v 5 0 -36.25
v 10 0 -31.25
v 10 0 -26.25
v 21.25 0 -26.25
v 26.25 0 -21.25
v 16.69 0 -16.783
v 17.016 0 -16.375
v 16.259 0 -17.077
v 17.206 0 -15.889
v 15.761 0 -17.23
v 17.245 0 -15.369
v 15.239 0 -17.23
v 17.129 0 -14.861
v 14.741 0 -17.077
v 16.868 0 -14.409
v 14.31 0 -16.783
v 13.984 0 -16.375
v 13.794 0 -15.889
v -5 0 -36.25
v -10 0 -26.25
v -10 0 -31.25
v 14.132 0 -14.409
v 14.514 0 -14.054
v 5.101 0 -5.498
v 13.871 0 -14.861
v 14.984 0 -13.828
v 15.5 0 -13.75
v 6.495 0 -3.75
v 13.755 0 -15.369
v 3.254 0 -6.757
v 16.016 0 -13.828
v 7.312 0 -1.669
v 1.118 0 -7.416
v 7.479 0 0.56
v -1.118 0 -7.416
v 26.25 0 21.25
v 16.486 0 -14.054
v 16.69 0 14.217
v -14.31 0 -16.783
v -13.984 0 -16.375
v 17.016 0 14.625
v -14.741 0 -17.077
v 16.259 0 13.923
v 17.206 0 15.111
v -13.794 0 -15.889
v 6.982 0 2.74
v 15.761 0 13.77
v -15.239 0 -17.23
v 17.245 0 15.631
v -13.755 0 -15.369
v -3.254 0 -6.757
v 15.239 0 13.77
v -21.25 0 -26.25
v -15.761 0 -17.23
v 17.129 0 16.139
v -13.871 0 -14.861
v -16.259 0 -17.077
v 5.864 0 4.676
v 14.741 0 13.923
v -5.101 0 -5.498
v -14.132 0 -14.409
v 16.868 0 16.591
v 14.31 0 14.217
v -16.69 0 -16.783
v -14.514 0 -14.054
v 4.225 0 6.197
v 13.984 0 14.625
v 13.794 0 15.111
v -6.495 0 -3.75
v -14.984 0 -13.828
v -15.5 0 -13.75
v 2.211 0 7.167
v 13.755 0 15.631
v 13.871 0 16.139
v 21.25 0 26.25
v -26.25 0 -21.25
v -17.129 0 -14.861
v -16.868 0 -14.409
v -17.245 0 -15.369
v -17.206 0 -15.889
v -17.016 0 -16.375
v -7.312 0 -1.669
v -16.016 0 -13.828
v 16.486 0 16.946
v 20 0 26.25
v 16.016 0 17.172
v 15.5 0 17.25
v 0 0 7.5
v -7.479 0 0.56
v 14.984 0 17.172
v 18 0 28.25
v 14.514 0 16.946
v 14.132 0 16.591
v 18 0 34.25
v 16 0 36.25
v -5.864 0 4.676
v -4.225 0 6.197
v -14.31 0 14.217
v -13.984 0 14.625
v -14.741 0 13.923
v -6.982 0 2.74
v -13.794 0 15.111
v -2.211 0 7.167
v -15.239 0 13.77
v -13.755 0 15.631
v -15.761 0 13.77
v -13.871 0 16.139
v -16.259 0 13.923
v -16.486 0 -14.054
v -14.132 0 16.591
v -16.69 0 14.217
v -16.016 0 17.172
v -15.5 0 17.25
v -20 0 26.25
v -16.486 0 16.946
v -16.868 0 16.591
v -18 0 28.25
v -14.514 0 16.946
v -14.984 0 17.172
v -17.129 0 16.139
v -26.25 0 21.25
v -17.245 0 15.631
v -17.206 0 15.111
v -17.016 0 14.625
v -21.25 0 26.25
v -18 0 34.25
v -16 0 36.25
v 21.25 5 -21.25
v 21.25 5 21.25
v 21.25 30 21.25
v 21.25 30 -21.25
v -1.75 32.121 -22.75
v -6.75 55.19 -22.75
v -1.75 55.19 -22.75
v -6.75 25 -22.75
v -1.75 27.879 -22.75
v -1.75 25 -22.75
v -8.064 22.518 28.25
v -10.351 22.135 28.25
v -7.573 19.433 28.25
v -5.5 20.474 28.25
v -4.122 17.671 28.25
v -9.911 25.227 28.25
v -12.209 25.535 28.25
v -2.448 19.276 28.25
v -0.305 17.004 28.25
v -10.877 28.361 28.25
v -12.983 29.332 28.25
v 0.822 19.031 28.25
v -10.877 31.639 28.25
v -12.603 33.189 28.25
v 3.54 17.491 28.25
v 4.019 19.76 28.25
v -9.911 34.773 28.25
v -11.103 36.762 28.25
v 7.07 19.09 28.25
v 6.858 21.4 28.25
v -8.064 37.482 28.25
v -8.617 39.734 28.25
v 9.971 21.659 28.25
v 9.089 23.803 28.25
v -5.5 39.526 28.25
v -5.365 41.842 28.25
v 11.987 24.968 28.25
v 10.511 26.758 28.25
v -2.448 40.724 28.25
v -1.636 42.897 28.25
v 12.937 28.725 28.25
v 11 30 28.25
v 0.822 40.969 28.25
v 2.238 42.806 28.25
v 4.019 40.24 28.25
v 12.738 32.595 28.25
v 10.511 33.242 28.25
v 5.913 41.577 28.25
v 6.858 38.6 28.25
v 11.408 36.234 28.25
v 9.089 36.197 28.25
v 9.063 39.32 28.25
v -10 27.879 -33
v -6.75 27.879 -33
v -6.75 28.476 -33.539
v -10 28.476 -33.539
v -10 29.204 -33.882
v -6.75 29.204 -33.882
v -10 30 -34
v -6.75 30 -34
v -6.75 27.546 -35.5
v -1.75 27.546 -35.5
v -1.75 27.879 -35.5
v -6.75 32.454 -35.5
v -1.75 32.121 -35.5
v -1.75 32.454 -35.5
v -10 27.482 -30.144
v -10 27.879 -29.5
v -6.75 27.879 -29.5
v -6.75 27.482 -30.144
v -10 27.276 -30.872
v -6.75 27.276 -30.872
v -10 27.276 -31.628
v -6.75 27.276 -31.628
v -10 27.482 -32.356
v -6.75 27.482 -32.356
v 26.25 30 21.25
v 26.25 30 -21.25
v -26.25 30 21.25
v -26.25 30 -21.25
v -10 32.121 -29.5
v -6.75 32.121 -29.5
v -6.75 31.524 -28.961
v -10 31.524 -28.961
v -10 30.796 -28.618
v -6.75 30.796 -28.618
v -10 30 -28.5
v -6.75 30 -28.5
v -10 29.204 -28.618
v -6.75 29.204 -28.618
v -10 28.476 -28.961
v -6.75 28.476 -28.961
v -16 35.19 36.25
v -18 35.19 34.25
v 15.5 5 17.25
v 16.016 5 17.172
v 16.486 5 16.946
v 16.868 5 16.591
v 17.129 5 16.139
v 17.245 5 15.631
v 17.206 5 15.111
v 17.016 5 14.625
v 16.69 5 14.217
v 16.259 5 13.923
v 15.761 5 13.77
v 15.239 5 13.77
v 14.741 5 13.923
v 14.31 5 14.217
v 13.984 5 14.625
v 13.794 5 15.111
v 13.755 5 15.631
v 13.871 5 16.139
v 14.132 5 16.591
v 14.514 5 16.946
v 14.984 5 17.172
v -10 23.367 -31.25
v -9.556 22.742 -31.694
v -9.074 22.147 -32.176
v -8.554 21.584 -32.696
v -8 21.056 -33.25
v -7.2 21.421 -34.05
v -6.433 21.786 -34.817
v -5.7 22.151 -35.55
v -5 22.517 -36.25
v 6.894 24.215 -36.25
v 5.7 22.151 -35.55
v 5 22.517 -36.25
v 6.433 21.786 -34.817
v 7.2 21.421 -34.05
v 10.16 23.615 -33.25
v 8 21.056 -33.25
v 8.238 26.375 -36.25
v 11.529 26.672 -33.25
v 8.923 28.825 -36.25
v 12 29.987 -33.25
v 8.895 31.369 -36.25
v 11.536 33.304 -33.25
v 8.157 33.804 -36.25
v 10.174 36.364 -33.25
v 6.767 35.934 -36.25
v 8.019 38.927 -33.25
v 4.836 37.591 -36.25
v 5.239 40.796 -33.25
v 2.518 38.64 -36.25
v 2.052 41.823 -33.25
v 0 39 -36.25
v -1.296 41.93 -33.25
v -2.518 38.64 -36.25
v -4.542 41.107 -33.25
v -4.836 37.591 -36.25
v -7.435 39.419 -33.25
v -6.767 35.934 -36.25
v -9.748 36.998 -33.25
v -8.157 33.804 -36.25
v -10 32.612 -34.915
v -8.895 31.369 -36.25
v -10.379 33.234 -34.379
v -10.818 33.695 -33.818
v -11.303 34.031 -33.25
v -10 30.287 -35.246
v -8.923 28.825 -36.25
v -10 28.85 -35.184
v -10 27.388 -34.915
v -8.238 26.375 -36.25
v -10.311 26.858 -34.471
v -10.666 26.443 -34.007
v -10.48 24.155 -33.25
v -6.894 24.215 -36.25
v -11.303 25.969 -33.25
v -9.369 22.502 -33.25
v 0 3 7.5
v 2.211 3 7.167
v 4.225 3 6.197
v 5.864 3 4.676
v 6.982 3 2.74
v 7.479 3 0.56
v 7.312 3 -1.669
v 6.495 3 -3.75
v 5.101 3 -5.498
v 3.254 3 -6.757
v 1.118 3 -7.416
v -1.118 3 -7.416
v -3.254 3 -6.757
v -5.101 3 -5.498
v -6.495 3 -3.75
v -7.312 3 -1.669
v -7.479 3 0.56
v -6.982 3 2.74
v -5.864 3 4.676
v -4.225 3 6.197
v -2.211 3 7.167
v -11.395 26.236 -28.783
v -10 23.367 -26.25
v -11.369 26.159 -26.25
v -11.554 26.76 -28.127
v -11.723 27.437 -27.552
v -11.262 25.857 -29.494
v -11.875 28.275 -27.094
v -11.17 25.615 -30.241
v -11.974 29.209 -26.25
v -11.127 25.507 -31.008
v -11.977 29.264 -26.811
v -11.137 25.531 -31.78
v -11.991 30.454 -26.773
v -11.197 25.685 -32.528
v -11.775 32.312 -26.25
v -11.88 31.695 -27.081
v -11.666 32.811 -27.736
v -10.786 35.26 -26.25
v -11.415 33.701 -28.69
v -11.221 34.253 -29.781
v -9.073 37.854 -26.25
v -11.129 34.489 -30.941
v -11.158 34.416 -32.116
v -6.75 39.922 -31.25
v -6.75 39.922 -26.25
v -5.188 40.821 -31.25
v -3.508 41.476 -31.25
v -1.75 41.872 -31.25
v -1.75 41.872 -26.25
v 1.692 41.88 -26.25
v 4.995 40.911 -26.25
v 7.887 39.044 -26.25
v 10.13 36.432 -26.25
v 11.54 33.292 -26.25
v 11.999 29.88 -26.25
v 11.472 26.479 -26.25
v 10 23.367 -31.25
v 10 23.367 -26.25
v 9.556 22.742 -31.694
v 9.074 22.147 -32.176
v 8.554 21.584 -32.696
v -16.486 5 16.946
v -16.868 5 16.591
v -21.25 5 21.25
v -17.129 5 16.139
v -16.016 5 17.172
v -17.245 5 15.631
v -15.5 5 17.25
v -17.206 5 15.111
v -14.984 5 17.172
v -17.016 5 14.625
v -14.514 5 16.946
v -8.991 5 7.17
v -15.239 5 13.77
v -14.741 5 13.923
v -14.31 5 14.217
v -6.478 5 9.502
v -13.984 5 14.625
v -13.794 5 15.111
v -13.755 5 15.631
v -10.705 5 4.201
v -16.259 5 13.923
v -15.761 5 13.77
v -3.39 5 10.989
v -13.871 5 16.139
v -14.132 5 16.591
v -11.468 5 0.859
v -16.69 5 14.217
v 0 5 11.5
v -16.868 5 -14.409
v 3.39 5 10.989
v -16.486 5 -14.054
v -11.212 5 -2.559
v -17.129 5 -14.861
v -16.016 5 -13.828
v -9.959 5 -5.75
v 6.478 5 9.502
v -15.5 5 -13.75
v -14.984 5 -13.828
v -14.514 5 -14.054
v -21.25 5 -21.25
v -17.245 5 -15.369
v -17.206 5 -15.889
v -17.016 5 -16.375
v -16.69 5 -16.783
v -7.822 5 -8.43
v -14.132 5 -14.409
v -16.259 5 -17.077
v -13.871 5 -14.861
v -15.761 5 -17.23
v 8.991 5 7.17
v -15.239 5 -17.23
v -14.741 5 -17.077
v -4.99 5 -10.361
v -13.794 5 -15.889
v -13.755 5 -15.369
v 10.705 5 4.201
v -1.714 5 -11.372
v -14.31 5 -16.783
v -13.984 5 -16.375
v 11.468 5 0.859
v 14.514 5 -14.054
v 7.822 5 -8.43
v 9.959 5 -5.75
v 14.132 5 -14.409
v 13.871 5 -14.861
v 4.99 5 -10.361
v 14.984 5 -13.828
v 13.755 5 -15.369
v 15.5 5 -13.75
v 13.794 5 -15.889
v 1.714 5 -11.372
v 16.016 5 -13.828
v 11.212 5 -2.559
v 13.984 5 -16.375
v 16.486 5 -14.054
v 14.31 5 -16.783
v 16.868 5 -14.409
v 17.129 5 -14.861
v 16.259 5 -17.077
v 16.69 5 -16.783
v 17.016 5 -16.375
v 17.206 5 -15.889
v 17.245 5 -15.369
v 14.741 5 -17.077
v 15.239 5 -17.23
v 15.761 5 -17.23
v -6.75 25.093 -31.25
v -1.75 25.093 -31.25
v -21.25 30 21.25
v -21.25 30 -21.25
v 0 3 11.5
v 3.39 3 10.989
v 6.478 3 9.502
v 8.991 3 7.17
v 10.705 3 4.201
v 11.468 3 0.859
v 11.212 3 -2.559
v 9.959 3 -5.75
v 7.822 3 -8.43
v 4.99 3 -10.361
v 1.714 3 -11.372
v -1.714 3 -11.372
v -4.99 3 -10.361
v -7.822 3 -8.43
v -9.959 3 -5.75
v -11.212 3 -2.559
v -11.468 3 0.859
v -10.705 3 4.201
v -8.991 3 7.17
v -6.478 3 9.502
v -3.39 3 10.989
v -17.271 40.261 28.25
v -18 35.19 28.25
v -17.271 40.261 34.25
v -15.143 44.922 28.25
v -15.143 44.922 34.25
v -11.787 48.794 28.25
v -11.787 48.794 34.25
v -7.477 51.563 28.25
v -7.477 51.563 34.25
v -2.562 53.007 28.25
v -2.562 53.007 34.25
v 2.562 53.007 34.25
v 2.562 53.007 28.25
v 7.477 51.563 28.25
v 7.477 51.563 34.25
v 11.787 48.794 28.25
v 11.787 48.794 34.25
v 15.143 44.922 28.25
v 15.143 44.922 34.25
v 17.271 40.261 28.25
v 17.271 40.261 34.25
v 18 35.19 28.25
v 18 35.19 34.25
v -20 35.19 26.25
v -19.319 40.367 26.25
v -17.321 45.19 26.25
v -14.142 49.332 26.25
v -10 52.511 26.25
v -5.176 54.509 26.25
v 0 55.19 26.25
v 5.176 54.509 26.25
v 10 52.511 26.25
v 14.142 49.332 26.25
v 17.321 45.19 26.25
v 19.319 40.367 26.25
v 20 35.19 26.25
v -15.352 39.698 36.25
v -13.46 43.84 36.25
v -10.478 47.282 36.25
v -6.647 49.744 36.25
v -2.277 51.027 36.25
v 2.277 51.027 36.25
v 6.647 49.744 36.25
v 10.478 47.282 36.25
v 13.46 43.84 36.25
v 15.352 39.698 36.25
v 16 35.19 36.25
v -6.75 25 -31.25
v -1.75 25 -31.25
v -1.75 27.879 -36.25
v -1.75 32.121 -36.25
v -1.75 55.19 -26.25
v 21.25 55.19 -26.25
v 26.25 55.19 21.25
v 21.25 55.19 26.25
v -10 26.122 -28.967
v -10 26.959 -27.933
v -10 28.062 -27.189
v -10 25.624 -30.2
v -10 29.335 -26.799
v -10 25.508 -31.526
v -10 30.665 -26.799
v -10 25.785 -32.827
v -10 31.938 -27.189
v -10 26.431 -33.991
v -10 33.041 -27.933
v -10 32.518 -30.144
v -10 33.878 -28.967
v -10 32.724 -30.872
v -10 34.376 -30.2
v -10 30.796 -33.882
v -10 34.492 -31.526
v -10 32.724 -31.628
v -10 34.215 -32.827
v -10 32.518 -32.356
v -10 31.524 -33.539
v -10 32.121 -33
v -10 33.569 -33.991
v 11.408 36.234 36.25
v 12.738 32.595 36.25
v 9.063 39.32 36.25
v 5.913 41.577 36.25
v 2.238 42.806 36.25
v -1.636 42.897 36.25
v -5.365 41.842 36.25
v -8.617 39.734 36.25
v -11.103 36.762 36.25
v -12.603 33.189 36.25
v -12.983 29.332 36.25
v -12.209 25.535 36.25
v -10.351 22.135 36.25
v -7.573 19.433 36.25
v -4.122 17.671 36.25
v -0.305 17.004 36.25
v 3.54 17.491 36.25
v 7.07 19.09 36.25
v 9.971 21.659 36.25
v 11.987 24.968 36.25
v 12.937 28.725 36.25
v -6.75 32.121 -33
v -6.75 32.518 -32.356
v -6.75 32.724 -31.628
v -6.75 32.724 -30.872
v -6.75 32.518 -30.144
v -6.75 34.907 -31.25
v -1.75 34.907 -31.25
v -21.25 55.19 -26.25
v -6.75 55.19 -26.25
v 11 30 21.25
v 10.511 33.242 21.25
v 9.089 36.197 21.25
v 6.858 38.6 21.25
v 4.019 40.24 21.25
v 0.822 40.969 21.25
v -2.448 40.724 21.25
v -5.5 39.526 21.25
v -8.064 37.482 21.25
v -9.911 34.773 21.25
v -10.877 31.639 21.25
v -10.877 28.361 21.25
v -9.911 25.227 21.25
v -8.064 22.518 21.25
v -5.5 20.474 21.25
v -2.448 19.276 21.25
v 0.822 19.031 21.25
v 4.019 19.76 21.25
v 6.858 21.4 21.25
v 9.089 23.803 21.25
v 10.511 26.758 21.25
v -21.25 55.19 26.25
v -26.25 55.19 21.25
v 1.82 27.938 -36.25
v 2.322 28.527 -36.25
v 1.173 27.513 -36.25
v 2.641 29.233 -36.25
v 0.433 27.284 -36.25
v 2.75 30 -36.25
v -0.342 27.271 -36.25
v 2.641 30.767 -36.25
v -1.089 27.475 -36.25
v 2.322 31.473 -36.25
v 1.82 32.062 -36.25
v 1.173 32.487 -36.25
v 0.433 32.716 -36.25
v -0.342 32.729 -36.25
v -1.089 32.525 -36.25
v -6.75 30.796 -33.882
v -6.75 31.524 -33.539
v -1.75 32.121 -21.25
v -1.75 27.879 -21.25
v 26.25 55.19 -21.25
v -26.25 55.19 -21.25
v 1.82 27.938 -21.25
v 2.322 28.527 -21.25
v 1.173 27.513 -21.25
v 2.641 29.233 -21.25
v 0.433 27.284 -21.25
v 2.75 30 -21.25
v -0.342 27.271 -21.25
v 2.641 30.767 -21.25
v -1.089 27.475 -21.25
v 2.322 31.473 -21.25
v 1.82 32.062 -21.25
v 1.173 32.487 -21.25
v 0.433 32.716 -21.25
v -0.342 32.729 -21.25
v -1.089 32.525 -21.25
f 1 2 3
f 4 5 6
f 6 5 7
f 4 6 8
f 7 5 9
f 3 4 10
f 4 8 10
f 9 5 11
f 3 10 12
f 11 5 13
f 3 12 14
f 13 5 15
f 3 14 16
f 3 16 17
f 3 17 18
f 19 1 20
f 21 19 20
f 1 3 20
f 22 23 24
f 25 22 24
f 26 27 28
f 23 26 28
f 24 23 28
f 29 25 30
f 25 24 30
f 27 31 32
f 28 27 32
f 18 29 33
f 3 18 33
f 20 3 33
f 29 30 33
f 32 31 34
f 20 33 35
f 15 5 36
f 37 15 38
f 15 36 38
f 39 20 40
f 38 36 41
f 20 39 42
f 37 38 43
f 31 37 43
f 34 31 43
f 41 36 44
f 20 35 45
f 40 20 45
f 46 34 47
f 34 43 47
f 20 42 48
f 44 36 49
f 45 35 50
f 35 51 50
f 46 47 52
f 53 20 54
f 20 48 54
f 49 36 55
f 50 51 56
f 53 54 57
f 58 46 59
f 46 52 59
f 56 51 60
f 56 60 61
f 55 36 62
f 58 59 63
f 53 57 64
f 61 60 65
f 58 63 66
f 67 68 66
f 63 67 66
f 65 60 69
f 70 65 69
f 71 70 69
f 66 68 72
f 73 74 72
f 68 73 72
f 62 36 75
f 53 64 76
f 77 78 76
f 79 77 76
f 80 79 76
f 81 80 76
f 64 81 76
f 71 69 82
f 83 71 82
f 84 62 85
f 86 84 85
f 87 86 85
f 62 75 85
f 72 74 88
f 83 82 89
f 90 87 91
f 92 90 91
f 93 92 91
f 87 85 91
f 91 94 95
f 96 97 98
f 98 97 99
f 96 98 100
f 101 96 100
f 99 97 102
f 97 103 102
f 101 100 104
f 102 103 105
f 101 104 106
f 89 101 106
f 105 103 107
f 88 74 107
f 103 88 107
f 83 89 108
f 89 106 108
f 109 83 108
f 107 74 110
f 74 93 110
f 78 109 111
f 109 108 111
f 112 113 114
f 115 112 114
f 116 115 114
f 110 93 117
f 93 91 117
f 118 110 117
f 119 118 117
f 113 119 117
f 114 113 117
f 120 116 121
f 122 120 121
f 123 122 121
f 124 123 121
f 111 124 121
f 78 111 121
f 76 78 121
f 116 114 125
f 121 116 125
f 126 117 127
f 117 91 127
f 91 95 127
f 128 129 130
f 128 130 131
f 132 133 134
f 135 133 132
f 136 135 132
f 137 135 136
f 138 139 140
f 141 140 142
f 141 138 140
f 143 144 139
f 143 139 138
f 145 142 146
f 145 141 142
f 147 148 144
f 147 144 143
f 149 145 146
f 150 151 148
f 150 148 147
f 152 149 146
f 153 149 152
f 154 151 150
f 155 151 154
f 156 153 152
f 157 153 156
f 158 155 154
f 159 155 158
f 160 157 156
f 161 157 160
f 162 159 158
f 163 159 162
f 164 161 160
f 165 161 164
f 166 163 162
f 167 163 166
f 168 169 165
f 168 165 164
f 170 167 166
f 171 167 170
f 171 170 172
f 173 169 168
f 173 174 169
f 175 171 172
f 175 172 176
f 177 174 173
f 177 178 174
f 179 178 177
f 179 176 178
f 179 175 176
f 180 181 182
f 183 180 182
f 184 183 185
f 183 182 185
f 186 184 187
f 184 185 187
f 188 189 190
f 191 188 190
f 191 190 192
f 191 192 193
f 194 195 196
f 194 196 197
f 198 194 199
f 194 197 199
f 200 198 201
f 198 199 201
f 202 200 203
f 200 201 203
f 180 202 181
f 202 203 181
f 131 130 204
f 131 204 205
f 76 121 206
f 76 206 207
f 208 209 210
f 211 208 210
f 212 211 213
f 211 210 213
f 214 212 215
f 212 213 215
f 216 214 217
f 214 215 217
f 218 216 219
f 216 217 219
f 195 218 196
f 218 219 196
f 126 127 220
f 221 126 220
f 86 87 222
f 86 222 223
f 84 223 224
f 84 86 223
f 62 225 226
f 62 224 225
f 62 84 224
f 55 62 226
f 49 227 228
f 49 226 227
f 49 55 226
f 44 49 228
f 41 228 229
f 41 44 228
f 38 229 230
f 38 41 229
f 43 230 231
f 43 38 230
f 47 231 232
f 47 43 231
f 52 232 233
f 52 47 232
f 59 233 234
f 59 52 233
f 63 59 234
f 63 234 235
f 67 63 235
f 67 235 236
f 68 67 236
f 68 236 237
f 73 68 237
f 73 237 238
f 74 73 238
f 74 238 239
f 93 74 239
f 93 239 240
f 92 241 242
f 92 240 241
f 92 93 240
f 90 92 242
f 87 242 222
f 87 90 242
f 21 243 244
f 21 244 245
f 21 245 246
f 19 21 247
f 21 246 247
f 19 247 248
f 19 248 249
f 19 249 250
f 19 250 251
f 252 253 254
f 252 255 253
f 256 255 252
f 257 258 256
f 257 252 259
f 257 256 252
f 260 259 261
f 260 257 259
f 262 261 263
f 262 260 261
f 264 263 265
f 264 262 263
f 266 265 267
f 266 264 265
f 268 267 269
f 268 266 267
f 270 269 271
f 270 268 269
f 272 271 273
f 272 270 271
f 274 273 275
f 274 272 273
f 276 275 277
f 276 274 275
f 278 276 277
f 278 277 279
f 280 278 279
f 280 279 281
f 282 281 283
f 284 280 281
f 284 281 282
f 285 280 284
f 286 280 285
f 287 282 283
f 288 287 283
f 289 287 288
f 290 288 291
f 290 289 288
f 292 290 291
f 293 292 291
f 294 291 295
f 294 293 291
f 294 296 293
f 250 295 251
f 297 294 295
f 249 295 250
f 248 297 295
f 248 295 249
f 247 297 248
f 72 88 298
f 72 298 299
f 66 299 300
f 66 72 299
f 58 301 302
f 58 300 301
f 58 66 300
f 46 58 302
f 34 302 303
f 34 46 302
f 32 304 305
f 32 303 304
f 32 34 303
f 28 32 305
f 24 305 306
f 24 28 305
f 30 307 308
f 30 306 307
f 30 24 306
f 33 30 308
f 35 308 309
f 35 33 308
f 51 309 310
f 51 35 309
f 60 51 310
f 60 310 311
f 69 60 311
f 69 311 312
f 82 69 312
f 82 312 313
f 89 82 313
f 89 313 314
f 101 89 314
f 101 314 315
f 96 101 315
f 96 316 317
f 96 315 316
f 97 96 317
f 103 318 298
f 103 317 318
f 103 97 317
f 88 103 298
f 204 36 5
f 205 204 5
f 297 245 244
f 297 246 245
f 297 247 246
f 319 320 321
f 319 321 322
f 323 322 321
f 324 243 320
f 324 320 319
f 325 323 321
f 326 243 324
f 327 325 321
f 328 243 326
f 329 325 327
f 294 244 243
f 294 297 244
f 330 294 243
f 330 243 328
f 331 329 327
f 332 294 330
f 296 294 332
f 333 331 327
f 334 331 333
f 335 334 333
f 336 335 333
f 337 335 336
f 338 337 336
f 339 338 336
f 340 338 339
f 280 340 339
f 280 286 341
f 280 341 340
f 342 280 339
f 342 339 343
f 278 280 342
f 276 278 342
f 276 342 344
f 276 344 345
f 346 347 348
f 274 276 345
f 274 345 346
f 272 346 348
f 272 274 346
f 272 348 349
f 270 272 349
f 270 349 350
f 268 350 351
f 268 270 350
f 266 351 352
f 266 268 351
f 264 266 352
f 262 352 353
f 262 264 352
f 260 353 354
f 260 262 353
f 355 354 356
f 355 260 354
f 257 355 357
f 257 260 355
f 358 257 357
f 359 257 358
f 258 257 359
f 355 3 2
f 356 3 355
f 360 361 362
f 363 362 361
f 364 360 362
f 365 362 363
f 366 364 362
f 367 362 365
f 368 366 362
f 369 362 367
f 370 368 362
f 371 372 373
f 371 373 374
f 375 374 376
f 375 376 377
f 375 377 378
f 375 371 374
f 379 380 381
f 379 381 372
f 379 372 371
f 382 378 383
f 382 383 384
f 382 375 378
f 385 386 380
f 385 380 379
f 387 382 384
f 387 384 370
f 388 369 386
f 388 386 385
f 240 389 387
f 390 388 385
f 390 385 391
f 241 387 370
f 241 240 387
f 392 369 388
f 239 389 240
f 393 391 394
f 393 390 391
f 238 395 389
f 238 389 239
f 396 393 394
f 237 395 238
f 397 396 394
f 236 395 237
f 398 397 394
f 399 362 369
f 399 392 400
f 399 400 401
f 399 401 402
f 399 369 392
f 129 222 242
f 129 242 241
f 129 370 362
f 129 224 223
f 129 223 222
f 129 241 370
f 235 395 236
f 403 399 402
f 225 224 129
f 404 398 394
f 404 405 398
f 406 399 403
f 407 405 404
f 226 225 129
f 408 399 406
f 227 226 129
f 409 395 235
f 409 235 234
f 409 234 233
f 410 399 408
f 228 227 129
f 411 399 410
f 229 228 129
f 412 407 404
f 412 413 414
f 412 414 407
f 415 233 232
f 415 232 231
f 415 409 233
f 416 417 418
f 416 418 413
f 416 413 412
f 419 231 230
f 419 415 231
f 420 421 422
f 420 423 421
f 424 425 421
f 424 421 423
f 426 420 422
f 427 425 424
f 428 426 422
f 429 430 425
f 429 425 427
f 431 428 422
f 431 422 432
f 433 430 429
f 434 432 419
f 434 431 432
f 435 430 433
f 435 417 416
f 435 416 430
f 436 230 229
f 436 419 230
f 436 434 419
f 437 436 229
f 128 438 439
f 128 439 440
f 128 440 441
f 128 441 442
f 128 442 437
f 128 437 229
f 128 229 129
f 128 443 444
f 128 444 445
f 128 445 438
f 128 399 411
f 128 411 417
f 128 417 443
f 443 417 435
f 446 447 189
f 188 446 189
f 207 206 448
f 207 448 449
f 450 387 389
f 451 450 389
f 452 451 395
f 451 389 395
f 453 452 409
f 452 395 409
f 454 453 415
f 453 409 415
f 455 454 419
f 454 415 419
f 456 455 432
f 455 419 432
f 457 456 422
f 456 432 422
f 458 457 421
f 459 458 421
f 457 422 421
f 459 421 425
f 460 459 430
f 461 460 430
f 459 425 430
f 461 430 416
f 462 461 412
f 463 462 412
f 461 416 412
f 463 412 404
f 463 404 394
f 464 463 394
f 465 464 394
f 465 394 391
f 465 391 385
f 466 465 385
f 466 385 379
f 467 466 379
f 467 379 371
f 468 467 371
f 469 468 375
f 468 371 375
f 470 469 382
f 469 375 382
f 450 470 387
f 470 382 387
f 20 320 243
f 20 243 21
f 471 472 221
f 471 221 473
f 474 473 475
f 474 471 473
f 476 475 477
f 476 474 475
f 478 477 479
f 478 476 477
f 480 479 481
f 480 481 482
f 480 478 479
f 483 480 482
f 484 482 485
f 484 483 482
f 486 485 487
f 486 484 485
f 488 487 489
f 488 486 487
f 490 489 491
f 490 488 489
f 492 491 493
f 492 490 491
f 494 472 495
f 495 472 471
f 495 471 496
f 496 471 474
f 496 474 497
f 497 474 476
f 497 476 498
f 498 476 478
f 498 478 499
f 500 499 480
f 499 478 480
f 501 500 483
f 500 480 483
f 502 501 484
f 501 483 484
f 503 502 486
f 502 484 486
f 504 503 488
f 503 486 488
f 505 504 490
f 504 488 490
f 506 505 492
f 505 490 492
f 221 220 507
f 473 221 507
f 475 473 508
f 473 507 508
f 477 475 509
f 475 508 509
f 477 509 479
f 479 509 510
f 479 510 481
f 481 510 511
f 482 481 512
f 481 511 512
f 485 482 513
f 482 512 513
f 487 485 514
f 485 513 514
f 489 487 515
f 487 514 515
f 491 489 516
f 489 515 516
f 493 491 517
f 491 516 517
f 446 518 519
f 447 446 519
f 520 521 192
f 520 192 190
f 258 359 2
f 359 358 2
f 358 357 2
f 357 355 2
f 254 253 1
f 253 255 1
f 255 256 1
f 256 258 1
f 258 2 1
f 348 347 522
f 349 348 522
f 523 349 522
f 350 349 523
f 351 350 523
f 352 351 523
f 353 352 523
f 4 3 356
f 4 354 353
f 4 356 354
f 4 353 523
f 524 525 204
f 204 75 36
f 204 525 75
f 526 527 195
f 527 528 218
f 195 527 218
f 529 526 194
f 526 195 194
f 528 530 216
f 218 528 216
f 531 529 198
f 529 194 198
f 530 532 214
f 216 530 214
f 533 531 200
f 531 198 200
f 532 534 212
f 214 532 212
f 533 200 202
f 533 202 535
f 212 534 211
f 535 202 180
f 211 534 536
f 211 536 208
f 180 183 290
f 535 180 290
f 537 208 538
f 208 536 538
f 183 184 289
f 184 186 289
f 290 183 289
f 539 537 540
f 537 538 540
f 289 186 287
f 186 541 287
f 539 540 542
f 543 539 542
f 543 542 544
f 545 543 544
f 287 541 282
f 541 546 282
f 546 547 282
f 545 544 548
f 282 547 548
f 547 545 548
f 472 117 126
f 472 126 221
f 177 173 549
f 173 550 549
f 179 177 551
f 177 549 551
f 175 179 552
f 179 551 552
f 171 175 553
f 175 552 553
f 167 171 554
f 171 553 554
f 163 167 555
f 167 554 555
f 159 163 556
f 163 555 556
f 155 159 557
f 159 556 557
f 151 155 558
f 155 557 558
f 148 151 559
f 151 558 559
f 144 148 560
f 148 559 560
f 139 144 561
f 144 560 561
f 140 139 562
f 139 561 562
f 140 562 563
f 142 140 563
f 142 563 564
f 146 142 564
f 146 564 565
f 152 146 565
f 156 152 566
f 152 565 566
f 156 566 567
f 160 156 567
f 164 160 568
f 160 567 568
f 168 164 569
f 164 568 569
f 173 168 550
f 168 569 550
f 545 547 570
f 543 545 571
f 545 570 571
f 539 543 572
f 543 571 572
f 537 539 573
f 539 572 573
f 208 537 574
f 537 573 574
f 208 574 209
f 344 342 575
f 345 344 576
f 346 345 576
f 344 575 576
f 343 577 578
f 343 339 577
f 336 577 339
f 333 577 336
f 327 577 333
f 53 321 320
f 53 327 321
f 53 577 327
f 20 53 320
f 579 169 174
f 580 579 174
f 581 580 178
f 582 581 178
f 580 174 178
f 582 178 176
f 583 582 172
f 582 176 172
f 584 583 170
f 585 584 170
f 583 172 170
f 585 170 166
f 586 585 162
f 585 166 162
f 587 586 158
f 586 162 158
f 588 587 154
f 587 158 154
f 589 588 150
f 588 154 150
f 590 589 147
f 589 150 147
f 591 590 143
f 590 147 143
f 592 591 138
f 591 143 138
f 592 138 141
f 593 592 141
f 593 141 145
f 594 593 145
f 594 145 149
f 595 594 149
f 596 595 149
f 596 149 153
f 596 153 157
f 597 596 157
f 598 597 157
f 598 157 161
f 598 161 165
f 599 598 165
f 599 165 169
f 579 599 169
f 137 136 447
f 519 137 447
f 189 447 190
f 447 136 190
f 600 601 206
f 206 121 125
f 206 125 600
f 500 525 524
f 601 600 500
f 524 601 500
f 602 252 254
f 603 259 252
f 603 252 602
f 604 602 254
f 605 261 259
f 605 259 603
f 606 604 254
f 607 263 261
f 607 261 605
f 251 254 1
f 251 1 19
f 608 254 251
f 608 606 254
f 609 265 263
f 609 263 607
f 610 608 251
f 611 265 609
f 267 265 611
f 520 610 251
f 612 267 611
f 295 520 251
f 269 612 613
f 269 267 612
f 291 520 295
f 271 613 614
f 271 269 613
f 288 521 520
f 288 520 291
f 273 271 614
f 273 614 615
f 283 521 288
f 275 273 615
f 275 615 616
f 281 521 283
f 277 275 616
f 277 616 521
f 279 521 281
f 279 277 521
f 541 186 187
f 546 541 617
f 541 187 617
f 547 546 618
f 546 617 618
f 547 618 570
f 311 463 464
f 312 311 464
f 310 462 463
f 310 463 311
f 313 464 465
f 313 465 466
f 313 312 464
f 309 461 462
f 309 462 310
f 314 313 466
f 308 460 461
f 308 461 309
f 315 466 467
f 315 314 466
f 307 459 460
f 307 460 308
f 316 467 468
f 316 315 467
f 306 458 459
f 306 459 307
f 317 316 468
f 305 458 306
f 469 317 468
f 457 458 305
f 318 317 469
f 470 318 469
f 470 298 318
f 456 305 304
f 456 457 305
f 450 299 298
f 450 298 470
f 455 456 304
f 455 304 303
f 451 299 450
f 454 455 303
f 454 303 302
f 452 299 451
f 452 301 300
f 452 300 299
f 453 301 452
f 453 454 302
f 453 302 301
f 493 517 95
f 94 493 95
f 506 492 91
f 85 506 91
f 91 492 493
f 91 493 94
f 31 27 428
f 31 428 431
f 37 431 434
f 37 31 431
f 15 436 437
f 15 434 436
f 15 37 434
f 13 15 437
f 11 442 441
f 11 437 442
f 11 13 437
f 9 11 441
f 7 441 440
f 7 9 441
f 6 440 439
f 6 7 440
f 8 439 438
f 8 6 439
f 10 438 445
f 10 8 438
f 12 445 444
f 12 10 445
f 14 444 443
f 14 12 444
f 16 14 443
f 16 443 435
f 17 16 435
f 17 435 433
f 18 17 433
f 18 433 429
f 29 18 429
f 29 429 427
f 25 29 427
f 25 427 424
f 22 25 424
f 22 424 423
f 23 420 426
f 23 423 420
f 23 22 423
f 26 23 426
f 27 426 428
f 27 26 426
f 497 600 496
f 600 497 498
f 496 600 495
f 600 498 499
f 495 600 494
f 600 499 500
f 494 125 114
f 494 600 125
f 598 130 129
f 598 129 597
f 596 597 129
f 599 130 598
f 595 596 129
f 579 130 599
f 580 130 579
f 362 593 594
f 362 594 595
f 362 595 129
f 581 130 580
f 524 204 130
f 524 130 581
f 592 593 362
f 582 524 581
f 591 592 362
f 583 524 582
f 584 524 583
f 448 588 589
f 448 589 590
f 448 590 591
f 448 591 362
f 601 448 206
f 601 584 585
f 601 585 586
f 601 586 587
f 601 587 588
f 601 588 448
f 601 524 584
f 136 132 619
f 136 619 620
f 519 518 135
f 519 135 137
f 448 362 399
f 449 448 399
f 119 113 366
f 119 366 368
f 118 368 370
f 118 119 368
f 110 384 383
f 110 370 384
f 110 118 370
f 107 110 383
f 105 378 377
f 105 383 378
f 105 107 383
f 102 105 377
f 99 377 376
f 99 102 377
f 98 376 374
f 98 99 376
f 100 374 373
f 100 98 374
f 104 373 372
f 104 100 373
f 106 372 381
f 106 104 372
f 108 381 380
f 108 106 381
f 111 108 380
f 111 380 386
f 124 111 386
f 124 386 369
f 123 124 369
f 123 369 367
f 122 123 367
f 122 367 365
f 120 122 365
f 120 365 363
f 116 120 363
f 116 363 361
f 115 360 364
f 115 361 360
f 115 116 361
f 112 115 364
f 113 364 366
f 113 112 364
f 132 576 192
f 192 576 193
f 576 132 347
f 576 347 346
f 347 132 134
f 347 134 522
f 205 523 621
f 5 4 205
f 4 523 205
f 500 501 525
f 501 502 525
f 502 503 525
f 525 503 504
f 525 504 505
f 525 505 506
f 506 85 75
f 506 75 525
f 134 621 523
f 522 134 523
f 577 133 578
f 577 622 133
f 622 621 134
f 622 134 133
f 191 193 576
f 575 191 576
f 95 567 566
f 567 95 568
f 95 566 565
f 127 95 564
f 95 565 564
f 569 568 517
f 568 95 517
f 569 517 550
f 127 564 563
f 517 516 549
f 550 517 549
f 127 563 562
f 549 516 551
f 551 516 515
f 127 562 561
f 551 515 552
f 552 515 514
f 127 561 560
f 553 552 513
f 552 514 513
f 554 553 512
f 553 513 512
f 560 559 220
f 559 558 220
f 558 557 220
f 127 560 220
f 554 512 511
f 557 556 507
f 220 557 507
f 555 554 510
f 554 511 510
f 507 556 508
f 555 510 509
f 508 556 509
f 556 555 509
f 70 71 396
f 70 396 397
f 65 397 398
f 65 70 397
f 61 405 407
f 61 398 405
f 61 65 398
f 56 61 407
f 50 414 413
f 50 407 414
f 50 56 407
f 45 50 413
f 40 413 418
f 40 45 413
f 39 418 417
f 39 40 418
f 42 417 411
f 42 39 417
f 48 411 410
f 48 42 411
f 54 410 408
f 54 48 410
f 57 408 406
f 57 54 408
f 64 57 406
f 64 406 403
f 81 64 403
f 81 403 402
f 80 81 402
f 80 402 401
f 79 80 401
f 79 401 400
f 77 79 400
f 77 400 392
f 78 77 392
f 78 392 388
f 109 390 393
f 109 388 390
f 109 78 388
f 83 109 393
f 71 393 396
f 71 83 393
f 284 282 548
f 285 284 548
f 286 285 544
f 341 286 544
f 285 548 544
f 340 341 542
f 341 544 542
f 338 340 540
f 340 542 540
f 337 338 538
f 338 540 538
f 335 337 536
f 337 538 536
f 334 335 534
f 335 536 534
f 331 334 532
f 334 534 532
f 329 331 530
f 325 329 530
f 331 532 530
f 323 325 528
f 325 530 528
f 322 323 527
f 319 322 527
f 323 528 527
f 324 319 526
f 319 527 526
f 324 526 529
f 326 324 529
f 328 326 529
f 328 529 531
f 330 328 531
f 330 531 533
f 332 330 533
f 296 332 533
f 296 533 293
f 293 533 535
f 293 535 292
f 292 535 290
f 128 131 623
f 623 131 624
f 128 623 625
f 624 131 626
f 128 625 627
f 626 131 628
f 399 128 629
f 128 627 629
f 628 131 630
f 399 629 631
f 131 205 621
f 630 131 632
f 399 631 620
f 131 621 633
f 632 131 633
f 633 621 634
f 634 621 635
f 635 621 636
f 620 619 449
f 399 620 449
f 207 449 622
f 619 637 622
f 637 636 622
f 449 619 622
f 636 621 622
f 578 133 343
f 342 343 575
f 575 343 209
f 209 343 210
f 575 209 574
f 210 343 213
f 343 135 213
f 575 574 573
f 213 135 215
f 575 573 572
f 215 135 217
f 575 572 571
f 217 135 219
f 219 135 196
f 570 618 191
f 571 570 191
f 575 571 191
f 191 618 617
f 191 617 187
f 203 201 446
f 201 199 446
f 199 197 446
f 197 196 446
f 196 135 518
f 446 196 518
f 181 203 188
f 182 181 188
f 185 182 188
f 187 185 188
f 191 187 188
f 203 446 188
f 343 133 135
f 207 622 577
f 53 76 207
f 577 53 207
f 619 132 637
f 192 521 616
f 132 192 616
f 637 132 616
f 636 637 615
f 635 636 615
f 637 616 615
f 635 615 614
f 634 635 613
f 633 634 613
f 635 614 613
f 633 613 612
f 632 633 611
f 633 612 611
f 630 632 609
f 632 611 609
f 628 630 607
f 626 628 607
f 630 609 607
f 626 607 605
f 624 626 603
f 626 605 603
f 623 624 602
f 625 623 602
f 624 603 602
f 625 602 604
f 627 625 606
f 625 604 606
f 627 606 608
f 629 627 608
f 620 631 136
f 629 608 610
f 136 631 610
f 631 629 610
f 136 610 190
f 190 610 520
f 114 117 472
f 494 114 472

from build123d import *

# Parameters (mm, degrees)
SKETCH1_W                = 52.5
SKETCH1_H                = 52.5
SKETCH1_W_2              = 42.5
SKETCH1_H_2              = 42.5
BOSS_EXTRUDE1_DEPTH      = 60
SKETCH2_W                = 42.5
SKETCH2_H                = 42.5
BOSS_EXTRUDE2_DEPTH      = 5
CUT_EXTRUDE1_DEPTH       = 67.3560472
CUT_EXTRUDE1_DEPTH_BACK  = 67.3560472
SKETCH3_R                = 1.75
SKETCH3_R_2              = 7.5
SKETCH4_R                = 11.5
CUT_EXTRUDE2_DEPTH       = 2
SKETCH5_R                = 0.75
SKETCH5_R_2              = 3.5
BOSS_EXTRUDE3_DEPTH      = 10
CUT_EXTRUDE3_DEPTH       = 84.936359821
CUT_EXTRUDE3_DEPTH_BACK  = 84.936359821
SKETCH6_W                = 52.5
SKETCH6_H                = 16.216064207
CUT_EXTRUDE4_START       = -23
SKETCH7_R                = 3.5
SKETCH7_R_2              = 0.75
CUT_EXTRUDE4_DEPTH       = 23
CHAMFER1_SIZE            = 5
CHAMFER3_SIZE            = 2
CHAMFER4_SIZE            = 1
SKETCH8_R                = 13
BOSS_EXTRUDE4_DEPTH      = 10
SKETCH9_R                = 12
CUT_EXTRUDE5_DEPTH       = 10
CHAMFER5_SIZE            = 2
CUT_EXTRUDE6_DEPTH       = 85.677697815
CUT_EXTRUDE6_DEPTH_BACK  = 85.677697815
SKETCH10_W               = 42.5
SKETCH10_H               = 45.698966911
SKETCH11_R               = 13
CUT_EXTRUDE7_DEPTH       = 10
SKETCH12_R               = 13
BOSS_EXTRUDE6_DEPTH      = 15
BOSS_EXTRUDE7_START      = -8
SKETCH13_R               = 13
BOSS_EXTRUDE7_DEPTH      = 7
SKETCH14_R               = 11
CUT_EXTRUDE8_DEPTH       = 14
SKETCH15_W               = 68.151817742
SKETCH15_H               = 162.163599098
CUT_EXTRUDE9_DEPTH       = 34
BOSS_EXTRUDE8_REACH      = 99.7
SKETCH16_R               = 12
SKETCH16_R_2             = 2.75
BOSS_EXTRUDE9_DEPTH      = 15
CHAMFER6_SIZE            = 3
CUT_EXTRUDE10_DEPTH      = 75.854024608
CUT_EXTRUDE10_DEPTH_BACK = 75.854024608
SKETCH18_W               = 80.381770786
SKETCH18_H               = 10.493887453
SKETCH19_R               = 2.75
CUT_EXTRUDE11_DEPTH      = 5
CUT_EXTRUDE12_START      = 25
SKETCH20_W               = 5
SKETCH20_H               = 8.5
CUT_EXTRUDE12_DEPTH      = 47.056838389
CUT_EXTRUDE13_DEPTH      = 72.721766444
CUT_EXTRUDE15_START      = -10
SKETCH21_R               = 4.5
CUT_EXTRUDE15_DEPTH      = 15


with BuildPart() as part:
    # Sketch1 → Boss-Extrude1 (new body)
    with BuildSketch(Plane(origin=(0, 0, 0), x_dir=(1, 0, 0), z_dir=(0, 1, 0))):
        Rectangle(SKETCH1_W, SKETCH1_H)
        Rectangle(SKETCH1_W_2, SKETCH1_H_2, mode=Mode.SUBTRACT)
    extrude(amount=BOSS_EXTRUDE1_DEPTH)

    # Sketch2 → Boss-Extrude2 (add)
    with BuildSketch(Plane(origin=(0, 0, 0), x_dir=(1, 0, 0), z_dir=(0, 1, 0))):
        Rectangle(SKETCH2_W, SKETCH2_H)
    extrude(amount=BOSS_EXTRUDE2_DEPTH)

    # Sketch3 → Cut-Extrude1 (cut, two sides: drawn at the far end of the back side and taken through both)
    with BuildSketch(Plane(origin=(0, 5, 0), x_dir=(1, 0, 0), z_dir=(0, 1, 0)).offset(-CUT_EXTRUDE1_DEPTH_BACK)):
        with Locations(Location((-15.5, 15.5, 0), (0, 0, 270))):
            Circle(SKETCH3_R)
        with Locations(Location((-15.5, -15.5, 0), (0, 0, 270))):
            Circle(SKETCH3_R)
        with Locations(Location((15.5, 15.5, 0), (0, 0, 270))):
            Circle(SKETCH3_R)
        with Locations(Location((15.5, -15.5, 0), (0, 0, 270))):
            Circle(SKETCH3_R)
        with Locations(Location((0, 0, 0), (0, 0, 270))):
            Circle(SKETCH3_R_2)
    extrude(amount=CUT_EXTRUDE1_DEPTH + CUT_EXTRUDE1_DEPTH_BACK, mode=Mode.SUBTRACT)

    # Sketch4 → Cut-Extrude2 (cut)
    with BuildSketch(Plane(origin=(0, 5, 0), x_dir=(1, 0, 0), z_dir=(0, 1, 0))):
        with Locations(Location((0, 0, 0), (0, 0, 270))):
            Circle(SKETCH4_R)
    extrude(amount=-CUT_EXTRUDE2_DEPTH, mode=Mode.SUBTRACT)

    # Sketch5 → Boss-Extrude3 (add)
    with BuildSketch(Plane(origin=(0, 0, -26.25), x_dir=(-1, 0, 0), z_dir=(0, 0, -1))):
        with BuildLine():
            Line((10, 30), (10, -2.899053056))
            ThreePointArc((10, -2.899053056), (0, -12.899053056), (-10, -2.899053056))
            Line((-10, -2.899053056), (-10, 30))
            ThreePointArc((-10, 30), (0, 40), (10, 30))
        make_face()
        with Locations((-4, 37)):
            Circle(SKETCH5_R, mode=Mode.SUBTRACT)
        with Locations((0, 37)):
            Circle(SKETCH5_R, mode=Mode.SUBTRACT)
        with Locations((4, 37)):
            Circle(SKETCH5_R, mode=Mode.SUBTRACT)
        with Locations((-7, 34)):
            Circle(SKETCH5_R, mode=Mode.SUBTRACT)
        with Locations((-7, 30)):
            Circle(SKETCH5_R, mode=Mode.SUBTRACT)
        with Locations((-7, 26)):
            Circle(SKETCH5_R, mode=Mode.SUBTRACT)
        with Locations((-4, 23)):
            Circle(SKETCH5_R, mode=Mode.SUBTRACT)
        with Locations((0, 23)):
            Circle(SKETCH5_R, mode=Mode.SUBTRACT)
        with Locations((4, 23)):
            Circle(SKETCH5_R, mode=Mode.SUBTRACT)
        with Locations((7, 26)):
            Circle(SKETCH5_R, mode=Mode.SUBTRACT)
        with Locations((7, 30)):
            Circle(SKETCH5_R, mode=Mode.SUBTRACT)
        with Locations((7, 34)):
            Circle(SKETCH5_R, mode=Mode.SUBTRACT)
        with Locations((0, 30)):
            Circle(SKETCH5_R_2, mode=Mode.SUBTRACT)
    extrude(amount=BOSS_EXTRUDE3_DEPTH)

    # Sketch6 → Cut-Extrude3 (cut, two sides: drawn at the far end of the back side and taken through both)
    with BuildSketch(Plane(origin=(0, 0, -26.25), x_dir=(-1, 0, 0), z_dir=(0, 0, -1)).offset(-CUT_EXTRUDE3_DEPTH_BACK)):
        with Locations((0, -8.108032104)):
            Rectangle(SKETCH6_W, SKETCH6_H)
    extrude(amount=CUT_EXTRUDE3_DEPTH + CUT_EXTRUDE3_DEPTH_BACK, mode=Mode.SUBTRACT)

    # Sketch7 → Cut-Extrude4 (cut)
    with BuildSketch(Plane(origin=(0, 0, -26.25), x_dir=(-1, 0, 0), z_dir=(0, 0, -1)).offset(CUT_EXTRUDE4_START)):
        with Locations(Location((0, 30, 0), (0, 0, 180))):
            Circle(SKETCH7_R)
        with Locations(Location((-4, 37, 0), (0, 0, 180))):
            Circle(SKETCH7_R_2)
        with Locations(Location((0, 37, 0), (0, 0, 180))):
            Circle(SKETCH7_R_2)
        with Locations(Location((4, 37, 0), (0, 0, 180))):
            Circle(SKETCH7_R_2)
        with Locations(Location((7, 34, 0), (0, 0, 180))):
            Circle(SKETCH7_R_2)
        with Locations(Location((7, 30, 0), (0, 0, 180))):
            Circle(SKETCH7_R_2)
        with Locations(Location((7, 26, 0), (0, 0, 180))):
            Circle(SKETCH7_R_2)
        with Locations(Location((4, 23, 0), (0, 0, 180))):
            Circle(SKETCH7_R_2)
        with Locations(Location((0, 23, 0), (0, 0, 180))):
            Circle(SKETCH7_R_2)
        with Locations(Location((-4, 23, 0), (0, 0, 180))):
            Circle(SKETCH7_R_2)
        with Locations(Location((-7, 26, 0), (0, 0, 180))):
            Circle(SKETCH7_R_2)
        with Locations(Location((-7, 30, 0), (0, 0, 180))):
            Circle(SKETCH7_R_2)
        with Locations(Location((-7, 34, 0), (0, 0, 180))):
            Circle(SKETCH7_R_2)
    extrude(amount=CUT_EXTRUDE4_DEPTH, mode=Mode.SUBTRACT)

    # Chamfer1
    # the kernel refuses this chamfer: 5 mm, written as the material it takes off along each edge
    with BuildSketch(Plane(origin=(26.25, -12.85841494, 26.25), x_dir=(-0.9996219169112968, 0, 0.027495876610586317), z_dir=(0, 1, 0)), Plane(origin=(-26.25, -12.85841494, 26.25), x_dir=(-0.027495876610586317, 0, -0.9996219169112968), z_dir=(0, 1, 0))) as chamfer1_piece_1:
        Polygon((CHAMFER1_SIZE * 0.999621916911, -CHAMFER1_SIZE * 0.0274958766106), (-CHAMFER1_SIZE * 0.0274958766106, -CHAMFER1_SIZE * 0.999621916911), (0, 0), align=None)
    extrude(amount=85.71682988, mode=Mode.SUBTRACT)
    with BuildSketch(Plane(origin=(26.25, -12.85841494, -26.25), x_dir=(-0.9996219169112968, 0, -0.027495876610586317), z_dir=(0, 1, 0)), Plane(origin=(-26.25, -12.85841494, -26.25), x_dir=(-0.027495876610586317, 0, 0.9996219169112968), z_dir=(0, 1, 0))) as chamfer1_piece_2:
        Polygon((CHAMFER1_SIZE * 0.999621916911, CHAMFER1_SIZE * 0.0274958766106), (-CHAMFER1_SIZE * 0.0274958766106, CHAMFER1_SIZE * 0.999621916911), (0, 0), align=None)
    extrude(amount=85.71682988, mode=Mode.SUBTRACT)
    with BuildSketch(Plane(origin=(-10, 30, -36.25), x_dir=(-0.027495876610586317, 0, 0.9996219169112968), z_dir=(0, -1, 0)), Plane(origin=(10, -12.85841494, -36.25), x_dir=(0.027495876610586317, 0, 0.9996219169112968), z_dir=(0, 1, 0))) as chamfer1_piece_3:
        Polygon((CHAMFER1_SIZE * 0.999621916911, -CHAMFER1_SIZE * 0.0274958766106), (-CHAMFER1_SIZE * 0.0274958766106, -CHAMFER1_SIZE * 0.999621916911), (0, 0), align=None)
    extrude(amount=42.85841494, mode=Mode.SUBTRACT)
    with BuildSketch(Plane(origin=(0, 30, -36.25), x_dir=(1, 0, 0), z_dir=(0, -1, 0))) as chamfer1_piece_4:
        Polygon((10, CHAMFER1_SIZE), (10 - CHAMFER1_SIZE, 0), (10, 0), align=None)
    revolve(axis=Axis((0, 30, -36.25), (0, 0, 1)), revolution_arc=180, mode=Mode.SUBTRACT)

    # Chamfer3
    chamfer3_edges = [part.edges().sort_by_distance(p)[0] for p in [
        (21.25, 60, 0),
        (0, 60, -21.25),
        (-21.25, 60, 0),
        (0, 60, 21.25),
    ]]
    chamfer(chamfer3_edges, length=CHAMFER3_SIZE)

    # Chamfer4
    chamfer4_edges = [part.edges().sort_by_distance(p)[0] for p in [
        (-3.5, 30, -21.25),
        (3.5, 30, -36.25),
    ]]
    chamfer(chamfer4_edges, length=CHAMFER4_SIZE)

    # Sketch8 → Boss-Extrude4 (add)
    with BuildSketch(Plane.XY.offset(26.25)):
        with BuildLine():
            Line((18, 35.190119423), (18, 0))
            Line((18, 0), (-18, 0))
            Line((-18, 0), (-18, 35.190119423))
            ThreePointArc((-18, 35.190119423), (0, 53.190119423), (18, 35.190119423))
        make_face()
        with Locations((0, 35.190119423)):
            Circle(SKETCH8_R, mode=Mode.SUBTRACT)
    extrude(amount=BOSS_EXTRUDE4_DEPTH)

    # Sketch9 → Cut-Extrude5 (cut)
    with BuildSketch(Plane.XY.offset(26.25)):
        with Locations((0, 35.190119423)):
            Circle(SKETCH9_R)
    extrude(amount=-CUT_EXTRUDE5_DEPTH, mode=Mode.SUBTRACT)

    # Chamfer5
    chamfer5_edges = [part.edges().sort_by_distance(p)[0] for p in [
        (0, 53.190119423, 36.25),
        (-18, 17.595059711, 36.25),
        (18, 17.595059711, 36.25),
        (0, 53.190119423, 26.25),
        (-18, 17.595059711, 26.25),
        (18, 17.595059711, 26.25),
    ]]
    chamfer(chamfer5_edges, length=CHAMFER5_SIZE)

    # Sketch10 → Cut-Extrude6 (cut, two sides: drawn at the far end of the back side and taken through both)
    with BuildSketch(Plane(origin=(-21.25, 0, 0), x_dir=(0, 0, -1), z_dir=(1, 0, 0)).offset(-CUT_EXTRUDE6_DEPTH_BACK)):
        with Locations((0, 52.849483455)):
            Rectangle(SKETCH10_W, SKETCH10_H)
    extrude(amount=CUT_EXTRUDE6_DEPTH + CUT_EXTRUDE6_DEPTH_BACK, mode=Mode.SUBTRACT)

    # Sketch11 → Cut-Extrude7 (cut)
    with BuildSketch(Plane.XY.offset(36.25)):
        with Locations((0, 30)):
            Circle(SKETCH11_R)
    extrude(amount=-CUT_EXTRUDE7_DEPTH, mode=Mode.SUBTRACT)

    # Sketch12 → Boss-Extrude6 (add)
    with BuildSketch(Plane.XY.offset(36.25)):
        with BuildLine():
            Line((13.742429917, 37), (13.742429917, 8.778772007))
            ThreePointArc((13.742429917, 8.778772007), (0, -4.96365791), (-13.742429917, 8.778772007))
            Line((-13.742429917, 8.778772007), (-13.742429917, 37))
            ThreePointArc((-13.742429917, 37), (0, 50.742429917), (13.742429917, 37))
        make_face()
        with Locations((0, 30)):
            Circle(SKETCH12_R, mode=Mode.SUBTRACT)
    extrude(amount=-BOSS_EXTRUDE6_DEPTH)

    # Sketch13 → Boss-Extrude7 (add)
    with BuildSketch(Plane.XY.offset(36.25).offset(BOSS_EXTRUDE7_START)):
        with Locations((0, 30)):
            Circle(SKETCH13_R)
    extrude(amount=-BOSS_EXTRUDE7_DEPTH)

    # Sketch14 → Cut-Extrude8 (cut)
    with BuildSketch(Plane.XY.offset(28.25)):
        with Locations((0, 30)):
            Circle(SKETCH14_R)
    extrude(amount=-CUT_EXTRUDE8_DEPTH, mode=Mode.SUBTRACT)

    # Sketch15 → Cut-Extrude9 (cut)
    with BuildSketch(Plane.XZ):
        Rectangle(SKETCH15_W, SKETCH15_H)
    extrude(amount=CUT_EXTRUDE9_DEPTH, mode=Mode.SUBTRACT)

    # Boss-Extrude8: up to this face of the body (flat: up to its plane)
    boss_extrude8_end = Plane(part.part.faces().sort_by_distance((23.75, 30.760345316, -21.25))[0])
    # Sketch16 → Boss-Extrude8 (add, up to the picked face)
    with BuildSketch(Plane(origin=(0, 0, -36.25), x_dir=(-1, 0, 0), z_dir=(0, 0, -1)), mode=Mode.PRIVATE) as boss_extrude8_sk1:
        with Locations((0, 30)):
            Circle(SKETCH16_R)
        with Locations((0, 30)):
            Circle(SKETCH16_R_2, mode=Mode.SUBTRACT)
    boss_extrude8_tool1 = split(extrude(boss_extrude8_sk1.sketch, amount=-BOSS_EXTRUDE8_REACH, mode=Mode.PRIVATE), bisect_by=boss_extrude8_end, keep=Keep.BOTH, mode=Mode.PRIVATE)
    add(boss_extrude8_tool1.solids().sort_by(Axis((11.660589, 30, -36.25), (0, 0, 1)))[0])

    # Sketch17 → Boss-Extrude9 (add)
    with BuildSketch(Plane(origin=(0, 0, -36.25), x_dir=(-1, 0, 0), z_dir=(0, 0, -1))):
        with BuildLine():
            Line((1.75, 32.121320344), (1.75, 27.878679656))
            ThreePointArc((1.75, 27.878679656), (2.75, 30), (1.75, 32.121320344))
        make_face()
    extrude(amount=-BOSS_EXTRUDE9_DEPTH)

    # Chamfer6
    chamfer6_edges = [part.edges().sort_by_distance(p)[0] for p in [
        (0, 42, -36.25),
    ]]
    chamfer(chamfer6_edges, length=CHAMFER6_SIZE)

    # Sketch18 → Cut-Extrude10 (cut, two sides: drawn at the far end of the back side and taken through both)
    with BuildSketch(Plane(origin=(0, 0, 0), x_dir=(0, 0, -1), z_dir=(1, 0, 0)).offset(-CUT_EXTRUDE10_DEPTH_BACK)):
        with Locations((0, 60.43706315)):
            Rectangle(SKETCH18_W, SKETCH18_H)
    extrude(amount=CUT_EXTRUDE10_DEPTH + CUT_EXTRUDE10_DEPTH_BACK, mode=Mode.SUBTRACT)

    # Sketch19 → Cut-Extrude11 (cut)
    with BuildSketch(Plane(origin=(-1.75, 0, 0), x_dir=(0, 0, -1), z_dir=(1, 0, 0))):
        Polygon((31.25, 34.907477288), (27, 32.453738644), (27, 27.546261356), (31.25, 25.092522712), (35.5, 27.546261356), (35.5, 32.453738644), align=None)
        with Locations(Location((31.25, 30, 0), (0, 0, 90))):
            Circle(SKETCH19_R, mode=Mode.SUBTRACT)
    extrude(amount=-CUT_EXTRUDE11_DEPTH, mode=Mode.SUBTRACT)

    # Sketch20 → Cut-Extrude12 (cut, through all)
    with BuildSketch(Plane(origin=(0, 0, 0), x_dir=(1, 0, 0), z_dir=(0, 1, 0)).offset(CUT_EXTRUDE12_START)):
        with Locations((-4.25, 27)):
            Rectangle(SKETCH20_W, SKETCH20_H)
    extrude(amount=CUT_EXTRUDE12_DEPTH, mode=Mode.SUBTRACT)

    # Sketch19<2> → Cut-Extrude13 (cut, through all)
    with BuildSketch(Plane(origin=(-1.75, 0, 0), x_dir=(0, 0, -1), z_dir=(1, 0, 0))):
        with BuildLine():
            Line((33, 32.121320344), (29.5, 32.121320344))
            ThreePointArc((29.5, 32.121320344), (28.5, 30), (29.5, 27.878679656))
            Line((29.5, 27.878679656), (33, 27.878679656))
            ThreePointArc((33, 27.878679656), (33.737468593, 28.82739606), (34, 30))
            ThreePointArc((34, 30), (33.737468593, 31.17260394), (33, 32.121320344))
        make_face()
        with BuildLine():
            ThreePointArc((33, 32.121320344), (31.25, 32.75), (29.5, 32.121320344))
            Line((29.5, 32.121320344), (33, 32.121320344))
        make_face()
        with BuildLine():
            Line((33, 27.878679656), (29.5, 27.878679656))
            ThreePointArc((29.5, 27.878679656), (31.25, 27.25), (33, 27.878679656))
        make_face()
    extrude(amount=-CUT_EXTRUDE13_DEPTH, mode=Mode.SUBTRACT)

    # Sketch21 → Cut-Extrude15 (cut)
    with BuildSketch(Plane(origin=(0, 0, 0), x_dir=(0, 0, -1), z_dir=(1, 0, 0)).offset(CUT_EXTRUDE15_START)):
        with Locations((31.25, 30)):
            Circle(SKETCH21_R)
    extrude(amount=-CUT_EXTRUDE15_DEPTH, mode=Mode.SUBTRACT)


solid = part.part
